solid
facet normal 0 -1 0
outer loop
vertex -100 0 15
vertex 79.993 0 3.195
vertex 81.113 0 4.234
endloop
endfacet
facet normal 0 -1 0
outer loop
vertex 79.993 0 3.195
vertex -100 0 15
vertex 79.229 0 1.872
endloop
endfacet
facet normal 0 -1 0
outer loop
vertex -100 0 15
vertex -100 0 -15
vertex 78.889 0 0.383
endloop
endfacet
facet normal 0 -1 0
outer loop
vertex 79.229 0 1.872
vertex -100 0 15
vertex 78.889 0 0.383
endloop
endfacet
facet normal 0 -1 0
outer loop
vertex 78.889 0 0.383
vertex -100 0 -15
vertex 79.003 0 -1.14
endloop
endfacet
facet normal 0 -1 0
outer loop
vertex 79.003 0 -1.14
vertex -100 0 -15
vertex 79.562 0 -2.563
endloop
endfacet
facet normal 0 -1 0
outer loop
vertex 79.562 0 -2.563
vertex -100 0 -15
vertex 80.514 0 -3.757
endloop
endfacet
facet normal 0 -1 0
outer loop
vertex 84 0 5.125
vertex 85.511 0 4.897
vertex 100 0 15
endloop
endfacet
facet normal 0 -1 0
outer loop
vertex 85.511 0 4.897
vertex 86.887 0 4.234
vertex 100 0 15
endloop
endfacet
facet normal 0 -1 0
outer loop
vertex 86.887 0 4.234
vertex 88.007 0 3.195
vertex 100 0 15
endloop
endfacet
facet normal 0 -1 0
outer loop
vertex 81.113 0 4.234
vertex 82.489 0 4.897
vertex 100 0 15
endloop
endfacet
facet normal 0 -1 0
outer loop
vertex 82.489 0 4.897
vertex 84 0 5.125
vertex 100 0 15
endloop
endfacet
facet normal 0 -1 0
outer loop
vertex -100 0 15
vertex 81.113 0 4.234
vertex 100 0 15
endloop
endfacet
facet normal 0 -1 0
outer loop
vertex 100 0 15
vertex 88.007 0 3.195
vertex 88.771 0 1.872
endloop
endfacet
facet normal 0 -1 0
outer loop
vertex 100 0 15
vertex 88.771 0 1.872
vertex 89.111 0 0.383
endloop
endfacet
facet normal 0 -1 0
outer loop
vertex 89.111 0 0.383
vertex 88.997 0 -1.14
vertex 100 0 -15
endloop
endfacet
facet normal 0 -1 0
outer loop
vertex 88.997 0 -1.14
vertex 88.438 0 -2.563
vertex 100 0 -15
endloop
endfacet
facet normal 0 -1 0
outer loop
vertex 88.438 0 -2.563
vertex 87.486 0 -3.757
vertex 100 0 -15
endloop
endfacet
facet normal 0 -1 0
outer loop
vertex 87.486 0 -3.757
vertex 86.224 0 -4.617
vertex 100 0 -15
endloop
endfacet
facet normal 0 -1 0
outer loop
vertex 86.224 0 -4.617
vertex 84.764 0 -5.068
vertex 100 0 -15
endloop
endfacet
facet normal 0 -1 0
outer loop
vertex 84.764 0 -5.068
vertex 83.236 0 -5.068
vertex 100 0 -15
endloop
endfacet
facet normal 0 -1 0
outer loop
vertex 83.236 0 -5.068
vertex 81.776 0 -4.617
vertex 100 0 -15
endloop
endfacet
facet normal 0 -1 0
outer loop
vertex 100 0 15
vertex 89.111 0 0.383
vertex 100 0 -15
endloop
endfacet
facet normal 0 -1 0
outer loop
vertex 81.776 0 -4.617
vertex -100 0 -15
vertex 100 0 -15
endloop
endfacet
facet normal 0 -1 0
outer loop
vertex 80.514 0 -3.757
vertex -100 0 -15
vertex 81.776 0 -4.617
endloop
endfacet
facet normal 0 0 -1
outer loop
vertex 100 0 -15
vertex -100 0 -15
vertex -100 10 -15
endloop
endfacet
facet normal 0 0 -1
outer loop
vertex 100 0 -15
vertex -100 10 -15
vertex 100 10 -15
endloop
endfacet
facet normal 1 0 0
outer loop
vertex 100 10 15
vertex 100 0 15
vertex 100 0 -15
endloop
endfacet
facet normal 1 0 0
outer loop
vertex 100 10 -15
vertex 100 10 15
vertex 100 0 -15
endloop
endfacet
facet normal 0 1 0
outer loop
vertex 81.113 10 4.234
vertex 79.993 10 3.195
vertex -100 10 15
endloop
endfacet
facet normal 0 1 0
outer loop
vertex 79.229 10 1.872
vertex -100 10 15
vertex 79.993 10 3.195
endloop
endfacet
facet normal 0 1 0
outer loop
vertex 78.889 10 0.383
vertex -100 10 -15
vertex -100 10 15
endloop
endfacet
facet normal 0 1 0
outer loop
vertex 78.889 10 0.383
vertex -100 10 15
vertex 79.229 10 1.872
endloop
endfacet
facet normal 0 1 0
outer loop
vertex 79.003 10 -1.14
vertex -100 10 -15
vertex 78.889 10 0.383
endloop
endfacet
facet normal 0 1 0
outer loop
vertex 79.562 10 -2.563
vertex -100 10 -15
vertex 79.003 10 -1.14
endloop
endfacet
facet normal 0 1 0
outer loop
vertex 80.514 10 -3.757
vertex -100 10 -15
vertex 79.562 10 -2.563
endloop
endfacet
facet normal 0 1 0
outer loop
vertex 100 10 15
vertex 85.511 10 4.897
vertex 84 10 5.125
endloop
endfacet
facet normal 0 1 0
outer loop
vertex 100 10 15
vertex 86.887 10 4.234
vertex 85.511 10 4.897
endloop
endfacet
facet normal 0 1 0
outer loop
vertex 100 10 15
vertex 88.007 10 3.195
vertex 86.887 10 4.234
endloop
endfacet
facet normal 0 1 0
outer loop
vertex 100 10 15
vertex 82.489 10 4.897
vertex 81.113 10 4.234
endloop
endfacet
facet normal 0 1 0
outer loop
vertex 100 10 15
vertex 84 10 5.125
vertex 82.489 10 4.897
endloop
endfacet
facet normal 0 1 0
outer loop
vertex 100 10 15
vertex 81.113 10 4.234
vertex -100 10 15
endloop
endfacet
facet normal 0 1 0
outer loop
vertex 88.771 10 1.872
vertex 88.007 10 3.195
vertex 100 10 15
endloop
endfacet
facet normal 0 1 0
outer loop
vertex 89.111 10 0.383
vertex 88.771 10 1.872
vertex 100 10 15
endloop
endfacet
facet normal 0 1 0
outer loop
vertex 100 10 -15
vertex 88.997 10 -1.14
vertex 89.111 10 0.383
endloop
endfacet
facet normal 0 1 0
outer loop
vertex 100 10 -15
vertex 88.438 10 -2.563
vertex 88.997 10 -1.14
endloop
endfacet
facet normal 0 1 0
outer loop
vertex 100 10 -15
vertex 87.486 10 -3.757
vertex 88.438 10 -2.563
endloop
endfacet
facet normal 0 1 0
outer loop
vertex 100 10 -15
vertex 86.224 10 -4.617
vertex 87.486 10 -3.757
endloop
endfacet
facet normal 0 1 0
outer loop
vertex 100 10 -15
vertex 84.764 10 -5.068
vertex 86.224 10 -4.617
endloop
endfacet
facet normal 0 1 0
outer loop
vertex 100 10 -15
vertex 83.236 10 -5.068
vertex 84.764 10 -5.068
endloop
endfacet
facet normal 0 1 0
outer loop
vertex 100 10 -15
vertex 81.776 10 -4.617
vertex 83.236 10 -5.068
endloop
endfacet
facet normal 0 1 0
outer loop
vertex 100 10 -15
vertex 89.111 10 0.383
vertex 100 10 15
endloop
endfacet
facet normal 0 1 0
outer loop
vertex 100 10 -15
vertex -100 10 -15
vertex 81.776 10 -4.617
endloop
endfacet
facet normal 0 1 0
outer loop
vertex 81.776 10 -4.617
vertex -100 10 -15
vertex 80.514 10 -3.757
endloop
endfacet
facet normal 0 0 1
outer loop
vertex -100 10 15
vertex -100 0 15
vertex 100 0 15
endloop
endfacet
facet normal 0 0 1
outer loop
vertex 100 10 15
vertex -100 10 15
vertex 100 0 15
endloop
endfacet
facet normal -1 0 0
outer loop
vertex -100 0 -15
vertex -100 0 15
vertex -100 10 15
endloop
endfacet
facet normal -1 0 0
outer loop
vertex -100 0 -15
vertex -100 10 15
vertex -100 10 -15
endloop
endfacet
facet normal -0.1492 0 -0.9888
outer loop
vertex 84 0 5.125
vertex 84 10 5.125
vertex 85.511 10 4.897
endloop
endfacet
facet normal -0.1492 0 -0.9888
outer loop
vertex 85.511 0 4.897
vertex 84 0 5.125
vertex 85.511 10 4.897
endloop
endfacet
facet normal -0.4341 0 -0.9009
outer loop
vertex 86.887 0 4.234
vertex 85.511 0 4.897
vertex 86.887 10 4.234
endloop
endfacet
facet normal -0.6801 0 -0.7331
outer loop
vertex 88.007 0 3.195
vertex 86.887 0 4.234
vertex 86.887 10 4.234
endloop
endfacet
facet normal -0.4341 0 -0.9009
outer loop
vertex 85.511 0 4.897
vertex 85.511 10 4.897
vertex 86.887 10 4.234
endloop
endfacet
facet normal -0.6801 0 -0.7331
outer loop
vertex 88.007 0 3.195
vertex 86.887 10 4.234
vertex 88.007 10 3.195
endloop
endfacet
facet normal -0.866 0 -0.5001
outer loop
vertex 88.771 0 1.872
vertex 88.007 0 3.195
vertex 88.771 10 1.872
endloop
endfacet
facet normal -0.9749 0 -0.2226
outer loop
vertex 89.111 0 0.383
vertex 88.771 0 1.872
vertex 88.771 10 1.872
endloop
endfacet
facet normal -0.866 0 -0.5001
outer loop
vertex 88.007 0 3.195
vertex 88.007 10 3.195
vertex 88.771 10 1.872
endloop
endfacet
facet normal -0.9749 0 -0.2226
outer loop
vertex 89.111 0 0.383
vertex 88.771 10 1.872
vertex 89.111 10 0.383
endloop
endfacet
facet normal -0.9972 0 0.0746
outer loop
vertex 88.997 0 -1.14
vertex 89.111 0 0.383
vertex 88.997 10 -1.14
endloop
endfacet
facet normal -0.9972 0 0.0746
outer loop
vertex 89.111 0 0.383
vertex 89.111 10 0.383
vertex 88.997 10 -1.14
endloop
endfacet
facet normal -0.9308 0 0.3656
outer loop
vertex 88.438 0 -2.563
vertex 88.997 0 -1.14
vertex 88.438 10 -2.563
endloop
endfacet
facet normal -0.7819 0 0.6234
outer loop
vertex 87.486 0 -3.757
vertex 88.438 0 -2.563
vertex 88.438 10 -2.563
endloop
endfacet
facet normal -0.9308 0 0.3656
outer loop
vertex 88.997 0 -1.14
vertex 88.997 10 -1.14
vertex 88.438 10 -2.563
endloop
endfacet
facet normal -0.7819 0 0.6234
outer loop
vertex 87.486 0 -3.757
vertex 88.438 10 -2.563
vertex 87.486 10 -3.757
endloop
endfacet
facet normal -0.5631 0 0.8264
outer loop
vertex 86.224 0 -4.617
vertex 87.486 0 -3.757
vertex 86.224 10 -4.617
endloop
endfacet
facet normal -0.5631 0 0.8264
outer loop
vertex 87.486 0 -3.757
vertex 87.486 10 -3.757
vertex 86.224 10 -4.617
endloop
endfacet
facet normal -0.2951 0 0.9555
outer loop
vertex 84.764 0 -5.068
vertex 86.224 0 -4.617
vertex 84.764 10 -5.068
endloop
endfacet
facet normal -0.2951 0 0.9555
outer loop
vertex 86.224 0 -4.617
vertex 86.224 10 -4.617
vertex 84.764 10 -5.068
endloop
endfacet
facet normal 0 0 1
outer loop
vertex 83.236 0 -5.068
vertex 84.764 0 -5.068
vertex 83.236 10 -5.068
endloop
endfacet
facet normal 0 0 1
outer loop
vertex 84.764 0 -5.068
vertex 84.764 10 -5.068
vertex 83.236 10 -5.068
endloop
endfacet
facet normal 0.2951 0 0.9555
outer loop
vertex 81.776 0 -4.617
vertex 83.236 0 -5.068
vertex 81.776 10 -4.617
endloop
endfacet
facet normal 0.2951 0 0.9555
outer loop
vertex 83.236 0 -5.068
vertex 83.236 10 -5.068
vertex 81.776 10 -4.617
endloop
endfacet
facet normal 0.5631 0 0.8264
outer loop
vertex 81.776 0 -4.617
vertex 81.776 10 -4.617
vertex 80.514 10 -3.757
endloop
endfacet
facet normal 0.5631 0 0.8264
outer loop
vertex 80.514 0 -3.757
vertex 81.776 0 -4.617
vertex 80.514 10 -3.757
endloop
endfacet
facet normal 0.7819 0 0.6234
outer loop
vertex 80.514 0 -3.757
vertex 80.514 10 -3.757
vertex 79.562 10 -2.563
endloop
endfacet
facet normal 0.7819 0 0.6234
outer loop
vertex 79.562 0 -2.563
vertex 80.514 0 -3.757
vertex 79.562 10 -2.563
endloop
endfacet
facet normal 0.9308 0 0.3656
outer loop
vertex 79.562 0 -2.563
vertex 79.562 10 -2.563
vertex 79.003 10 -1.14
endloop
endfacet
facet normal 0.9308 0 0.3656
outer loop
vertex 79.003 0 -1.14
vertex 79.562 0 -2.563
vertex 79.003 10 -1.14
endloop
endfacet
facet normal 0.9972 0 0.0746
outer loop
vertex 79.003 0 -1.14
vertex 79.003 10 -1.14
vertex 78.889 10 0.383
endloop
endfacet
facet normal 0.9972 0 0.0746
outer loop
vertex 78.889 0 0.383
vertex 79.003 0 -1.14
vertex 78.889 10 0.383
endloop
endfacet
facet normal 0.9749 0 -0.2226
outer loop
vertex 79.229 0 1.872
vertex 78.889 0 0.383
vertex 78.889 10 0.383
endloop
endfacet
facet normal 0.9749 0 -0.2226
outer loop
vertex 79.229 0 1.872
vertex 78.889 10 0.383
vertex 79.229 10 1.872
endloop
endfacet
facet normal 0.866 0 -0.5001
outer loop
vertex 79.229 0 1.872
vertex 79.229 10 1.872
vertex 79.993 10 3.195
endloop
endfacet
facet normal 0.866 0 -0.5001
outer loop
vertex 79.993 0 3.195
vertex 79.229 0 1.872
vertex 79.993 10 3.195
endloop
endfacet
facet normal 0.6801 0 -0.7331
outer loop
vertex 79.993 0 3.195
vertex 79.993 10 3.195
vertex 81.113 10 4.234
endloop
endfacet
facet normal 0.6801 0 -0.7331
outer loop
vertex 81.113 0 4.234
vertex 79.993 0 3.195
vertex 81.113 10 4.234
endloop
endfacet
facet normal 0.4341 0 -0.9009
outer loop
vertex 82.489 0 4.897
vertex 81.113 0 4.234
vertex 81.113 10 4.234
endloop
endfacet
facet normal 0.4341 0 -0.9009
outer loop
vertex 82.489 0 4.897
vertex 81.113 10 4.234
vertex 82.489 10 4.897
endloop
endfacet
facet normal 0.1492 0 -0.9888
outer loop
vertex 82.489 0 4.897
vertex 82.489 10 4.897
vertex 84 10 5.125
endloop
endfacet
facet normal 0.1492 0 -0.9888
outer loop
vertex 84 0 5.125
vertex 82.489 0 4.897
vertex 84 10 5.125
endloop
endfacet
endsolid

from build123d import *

# Parameters (mm, degrees)
SKETCH1_W           = 200
SKETCH1_H           = 30
BOSS_EXTRUDE1_DEPTH = 10
SKETCH2_R           = 5.125
CUT_EXTRUDE1_DEPTH  = 102.612007165


with BuildPart() as part:
    # Sketch1 → Boss-Extrude1 (new body)
    with BuildSketch(Plane(origin=(0, 0, 0), x_dir=(1, 0, 0), z_dir=(0, 1, 0))):
        Rectangle(SKETCH1_W, SKETCH1_H)
    extrude(amount=BOSS_EXTRUDE1_DEPTH)

    # Sketch2 → Cut-Extrude1 (cut, through all)
    with BuildSketch(Plane(origin=(0, 10, 0), x_dir=(1, 0, 0), z_dir=(0, 1, 0))):
        with Locations(Location((84, 0, 0), (0, 0, 270))):
            Circle(SKETCH2_R)
    extrude(amount=-CUT_EXTRUDE1_DEPTH, mode=Mode.SUBTRACT)


solid = part.part
